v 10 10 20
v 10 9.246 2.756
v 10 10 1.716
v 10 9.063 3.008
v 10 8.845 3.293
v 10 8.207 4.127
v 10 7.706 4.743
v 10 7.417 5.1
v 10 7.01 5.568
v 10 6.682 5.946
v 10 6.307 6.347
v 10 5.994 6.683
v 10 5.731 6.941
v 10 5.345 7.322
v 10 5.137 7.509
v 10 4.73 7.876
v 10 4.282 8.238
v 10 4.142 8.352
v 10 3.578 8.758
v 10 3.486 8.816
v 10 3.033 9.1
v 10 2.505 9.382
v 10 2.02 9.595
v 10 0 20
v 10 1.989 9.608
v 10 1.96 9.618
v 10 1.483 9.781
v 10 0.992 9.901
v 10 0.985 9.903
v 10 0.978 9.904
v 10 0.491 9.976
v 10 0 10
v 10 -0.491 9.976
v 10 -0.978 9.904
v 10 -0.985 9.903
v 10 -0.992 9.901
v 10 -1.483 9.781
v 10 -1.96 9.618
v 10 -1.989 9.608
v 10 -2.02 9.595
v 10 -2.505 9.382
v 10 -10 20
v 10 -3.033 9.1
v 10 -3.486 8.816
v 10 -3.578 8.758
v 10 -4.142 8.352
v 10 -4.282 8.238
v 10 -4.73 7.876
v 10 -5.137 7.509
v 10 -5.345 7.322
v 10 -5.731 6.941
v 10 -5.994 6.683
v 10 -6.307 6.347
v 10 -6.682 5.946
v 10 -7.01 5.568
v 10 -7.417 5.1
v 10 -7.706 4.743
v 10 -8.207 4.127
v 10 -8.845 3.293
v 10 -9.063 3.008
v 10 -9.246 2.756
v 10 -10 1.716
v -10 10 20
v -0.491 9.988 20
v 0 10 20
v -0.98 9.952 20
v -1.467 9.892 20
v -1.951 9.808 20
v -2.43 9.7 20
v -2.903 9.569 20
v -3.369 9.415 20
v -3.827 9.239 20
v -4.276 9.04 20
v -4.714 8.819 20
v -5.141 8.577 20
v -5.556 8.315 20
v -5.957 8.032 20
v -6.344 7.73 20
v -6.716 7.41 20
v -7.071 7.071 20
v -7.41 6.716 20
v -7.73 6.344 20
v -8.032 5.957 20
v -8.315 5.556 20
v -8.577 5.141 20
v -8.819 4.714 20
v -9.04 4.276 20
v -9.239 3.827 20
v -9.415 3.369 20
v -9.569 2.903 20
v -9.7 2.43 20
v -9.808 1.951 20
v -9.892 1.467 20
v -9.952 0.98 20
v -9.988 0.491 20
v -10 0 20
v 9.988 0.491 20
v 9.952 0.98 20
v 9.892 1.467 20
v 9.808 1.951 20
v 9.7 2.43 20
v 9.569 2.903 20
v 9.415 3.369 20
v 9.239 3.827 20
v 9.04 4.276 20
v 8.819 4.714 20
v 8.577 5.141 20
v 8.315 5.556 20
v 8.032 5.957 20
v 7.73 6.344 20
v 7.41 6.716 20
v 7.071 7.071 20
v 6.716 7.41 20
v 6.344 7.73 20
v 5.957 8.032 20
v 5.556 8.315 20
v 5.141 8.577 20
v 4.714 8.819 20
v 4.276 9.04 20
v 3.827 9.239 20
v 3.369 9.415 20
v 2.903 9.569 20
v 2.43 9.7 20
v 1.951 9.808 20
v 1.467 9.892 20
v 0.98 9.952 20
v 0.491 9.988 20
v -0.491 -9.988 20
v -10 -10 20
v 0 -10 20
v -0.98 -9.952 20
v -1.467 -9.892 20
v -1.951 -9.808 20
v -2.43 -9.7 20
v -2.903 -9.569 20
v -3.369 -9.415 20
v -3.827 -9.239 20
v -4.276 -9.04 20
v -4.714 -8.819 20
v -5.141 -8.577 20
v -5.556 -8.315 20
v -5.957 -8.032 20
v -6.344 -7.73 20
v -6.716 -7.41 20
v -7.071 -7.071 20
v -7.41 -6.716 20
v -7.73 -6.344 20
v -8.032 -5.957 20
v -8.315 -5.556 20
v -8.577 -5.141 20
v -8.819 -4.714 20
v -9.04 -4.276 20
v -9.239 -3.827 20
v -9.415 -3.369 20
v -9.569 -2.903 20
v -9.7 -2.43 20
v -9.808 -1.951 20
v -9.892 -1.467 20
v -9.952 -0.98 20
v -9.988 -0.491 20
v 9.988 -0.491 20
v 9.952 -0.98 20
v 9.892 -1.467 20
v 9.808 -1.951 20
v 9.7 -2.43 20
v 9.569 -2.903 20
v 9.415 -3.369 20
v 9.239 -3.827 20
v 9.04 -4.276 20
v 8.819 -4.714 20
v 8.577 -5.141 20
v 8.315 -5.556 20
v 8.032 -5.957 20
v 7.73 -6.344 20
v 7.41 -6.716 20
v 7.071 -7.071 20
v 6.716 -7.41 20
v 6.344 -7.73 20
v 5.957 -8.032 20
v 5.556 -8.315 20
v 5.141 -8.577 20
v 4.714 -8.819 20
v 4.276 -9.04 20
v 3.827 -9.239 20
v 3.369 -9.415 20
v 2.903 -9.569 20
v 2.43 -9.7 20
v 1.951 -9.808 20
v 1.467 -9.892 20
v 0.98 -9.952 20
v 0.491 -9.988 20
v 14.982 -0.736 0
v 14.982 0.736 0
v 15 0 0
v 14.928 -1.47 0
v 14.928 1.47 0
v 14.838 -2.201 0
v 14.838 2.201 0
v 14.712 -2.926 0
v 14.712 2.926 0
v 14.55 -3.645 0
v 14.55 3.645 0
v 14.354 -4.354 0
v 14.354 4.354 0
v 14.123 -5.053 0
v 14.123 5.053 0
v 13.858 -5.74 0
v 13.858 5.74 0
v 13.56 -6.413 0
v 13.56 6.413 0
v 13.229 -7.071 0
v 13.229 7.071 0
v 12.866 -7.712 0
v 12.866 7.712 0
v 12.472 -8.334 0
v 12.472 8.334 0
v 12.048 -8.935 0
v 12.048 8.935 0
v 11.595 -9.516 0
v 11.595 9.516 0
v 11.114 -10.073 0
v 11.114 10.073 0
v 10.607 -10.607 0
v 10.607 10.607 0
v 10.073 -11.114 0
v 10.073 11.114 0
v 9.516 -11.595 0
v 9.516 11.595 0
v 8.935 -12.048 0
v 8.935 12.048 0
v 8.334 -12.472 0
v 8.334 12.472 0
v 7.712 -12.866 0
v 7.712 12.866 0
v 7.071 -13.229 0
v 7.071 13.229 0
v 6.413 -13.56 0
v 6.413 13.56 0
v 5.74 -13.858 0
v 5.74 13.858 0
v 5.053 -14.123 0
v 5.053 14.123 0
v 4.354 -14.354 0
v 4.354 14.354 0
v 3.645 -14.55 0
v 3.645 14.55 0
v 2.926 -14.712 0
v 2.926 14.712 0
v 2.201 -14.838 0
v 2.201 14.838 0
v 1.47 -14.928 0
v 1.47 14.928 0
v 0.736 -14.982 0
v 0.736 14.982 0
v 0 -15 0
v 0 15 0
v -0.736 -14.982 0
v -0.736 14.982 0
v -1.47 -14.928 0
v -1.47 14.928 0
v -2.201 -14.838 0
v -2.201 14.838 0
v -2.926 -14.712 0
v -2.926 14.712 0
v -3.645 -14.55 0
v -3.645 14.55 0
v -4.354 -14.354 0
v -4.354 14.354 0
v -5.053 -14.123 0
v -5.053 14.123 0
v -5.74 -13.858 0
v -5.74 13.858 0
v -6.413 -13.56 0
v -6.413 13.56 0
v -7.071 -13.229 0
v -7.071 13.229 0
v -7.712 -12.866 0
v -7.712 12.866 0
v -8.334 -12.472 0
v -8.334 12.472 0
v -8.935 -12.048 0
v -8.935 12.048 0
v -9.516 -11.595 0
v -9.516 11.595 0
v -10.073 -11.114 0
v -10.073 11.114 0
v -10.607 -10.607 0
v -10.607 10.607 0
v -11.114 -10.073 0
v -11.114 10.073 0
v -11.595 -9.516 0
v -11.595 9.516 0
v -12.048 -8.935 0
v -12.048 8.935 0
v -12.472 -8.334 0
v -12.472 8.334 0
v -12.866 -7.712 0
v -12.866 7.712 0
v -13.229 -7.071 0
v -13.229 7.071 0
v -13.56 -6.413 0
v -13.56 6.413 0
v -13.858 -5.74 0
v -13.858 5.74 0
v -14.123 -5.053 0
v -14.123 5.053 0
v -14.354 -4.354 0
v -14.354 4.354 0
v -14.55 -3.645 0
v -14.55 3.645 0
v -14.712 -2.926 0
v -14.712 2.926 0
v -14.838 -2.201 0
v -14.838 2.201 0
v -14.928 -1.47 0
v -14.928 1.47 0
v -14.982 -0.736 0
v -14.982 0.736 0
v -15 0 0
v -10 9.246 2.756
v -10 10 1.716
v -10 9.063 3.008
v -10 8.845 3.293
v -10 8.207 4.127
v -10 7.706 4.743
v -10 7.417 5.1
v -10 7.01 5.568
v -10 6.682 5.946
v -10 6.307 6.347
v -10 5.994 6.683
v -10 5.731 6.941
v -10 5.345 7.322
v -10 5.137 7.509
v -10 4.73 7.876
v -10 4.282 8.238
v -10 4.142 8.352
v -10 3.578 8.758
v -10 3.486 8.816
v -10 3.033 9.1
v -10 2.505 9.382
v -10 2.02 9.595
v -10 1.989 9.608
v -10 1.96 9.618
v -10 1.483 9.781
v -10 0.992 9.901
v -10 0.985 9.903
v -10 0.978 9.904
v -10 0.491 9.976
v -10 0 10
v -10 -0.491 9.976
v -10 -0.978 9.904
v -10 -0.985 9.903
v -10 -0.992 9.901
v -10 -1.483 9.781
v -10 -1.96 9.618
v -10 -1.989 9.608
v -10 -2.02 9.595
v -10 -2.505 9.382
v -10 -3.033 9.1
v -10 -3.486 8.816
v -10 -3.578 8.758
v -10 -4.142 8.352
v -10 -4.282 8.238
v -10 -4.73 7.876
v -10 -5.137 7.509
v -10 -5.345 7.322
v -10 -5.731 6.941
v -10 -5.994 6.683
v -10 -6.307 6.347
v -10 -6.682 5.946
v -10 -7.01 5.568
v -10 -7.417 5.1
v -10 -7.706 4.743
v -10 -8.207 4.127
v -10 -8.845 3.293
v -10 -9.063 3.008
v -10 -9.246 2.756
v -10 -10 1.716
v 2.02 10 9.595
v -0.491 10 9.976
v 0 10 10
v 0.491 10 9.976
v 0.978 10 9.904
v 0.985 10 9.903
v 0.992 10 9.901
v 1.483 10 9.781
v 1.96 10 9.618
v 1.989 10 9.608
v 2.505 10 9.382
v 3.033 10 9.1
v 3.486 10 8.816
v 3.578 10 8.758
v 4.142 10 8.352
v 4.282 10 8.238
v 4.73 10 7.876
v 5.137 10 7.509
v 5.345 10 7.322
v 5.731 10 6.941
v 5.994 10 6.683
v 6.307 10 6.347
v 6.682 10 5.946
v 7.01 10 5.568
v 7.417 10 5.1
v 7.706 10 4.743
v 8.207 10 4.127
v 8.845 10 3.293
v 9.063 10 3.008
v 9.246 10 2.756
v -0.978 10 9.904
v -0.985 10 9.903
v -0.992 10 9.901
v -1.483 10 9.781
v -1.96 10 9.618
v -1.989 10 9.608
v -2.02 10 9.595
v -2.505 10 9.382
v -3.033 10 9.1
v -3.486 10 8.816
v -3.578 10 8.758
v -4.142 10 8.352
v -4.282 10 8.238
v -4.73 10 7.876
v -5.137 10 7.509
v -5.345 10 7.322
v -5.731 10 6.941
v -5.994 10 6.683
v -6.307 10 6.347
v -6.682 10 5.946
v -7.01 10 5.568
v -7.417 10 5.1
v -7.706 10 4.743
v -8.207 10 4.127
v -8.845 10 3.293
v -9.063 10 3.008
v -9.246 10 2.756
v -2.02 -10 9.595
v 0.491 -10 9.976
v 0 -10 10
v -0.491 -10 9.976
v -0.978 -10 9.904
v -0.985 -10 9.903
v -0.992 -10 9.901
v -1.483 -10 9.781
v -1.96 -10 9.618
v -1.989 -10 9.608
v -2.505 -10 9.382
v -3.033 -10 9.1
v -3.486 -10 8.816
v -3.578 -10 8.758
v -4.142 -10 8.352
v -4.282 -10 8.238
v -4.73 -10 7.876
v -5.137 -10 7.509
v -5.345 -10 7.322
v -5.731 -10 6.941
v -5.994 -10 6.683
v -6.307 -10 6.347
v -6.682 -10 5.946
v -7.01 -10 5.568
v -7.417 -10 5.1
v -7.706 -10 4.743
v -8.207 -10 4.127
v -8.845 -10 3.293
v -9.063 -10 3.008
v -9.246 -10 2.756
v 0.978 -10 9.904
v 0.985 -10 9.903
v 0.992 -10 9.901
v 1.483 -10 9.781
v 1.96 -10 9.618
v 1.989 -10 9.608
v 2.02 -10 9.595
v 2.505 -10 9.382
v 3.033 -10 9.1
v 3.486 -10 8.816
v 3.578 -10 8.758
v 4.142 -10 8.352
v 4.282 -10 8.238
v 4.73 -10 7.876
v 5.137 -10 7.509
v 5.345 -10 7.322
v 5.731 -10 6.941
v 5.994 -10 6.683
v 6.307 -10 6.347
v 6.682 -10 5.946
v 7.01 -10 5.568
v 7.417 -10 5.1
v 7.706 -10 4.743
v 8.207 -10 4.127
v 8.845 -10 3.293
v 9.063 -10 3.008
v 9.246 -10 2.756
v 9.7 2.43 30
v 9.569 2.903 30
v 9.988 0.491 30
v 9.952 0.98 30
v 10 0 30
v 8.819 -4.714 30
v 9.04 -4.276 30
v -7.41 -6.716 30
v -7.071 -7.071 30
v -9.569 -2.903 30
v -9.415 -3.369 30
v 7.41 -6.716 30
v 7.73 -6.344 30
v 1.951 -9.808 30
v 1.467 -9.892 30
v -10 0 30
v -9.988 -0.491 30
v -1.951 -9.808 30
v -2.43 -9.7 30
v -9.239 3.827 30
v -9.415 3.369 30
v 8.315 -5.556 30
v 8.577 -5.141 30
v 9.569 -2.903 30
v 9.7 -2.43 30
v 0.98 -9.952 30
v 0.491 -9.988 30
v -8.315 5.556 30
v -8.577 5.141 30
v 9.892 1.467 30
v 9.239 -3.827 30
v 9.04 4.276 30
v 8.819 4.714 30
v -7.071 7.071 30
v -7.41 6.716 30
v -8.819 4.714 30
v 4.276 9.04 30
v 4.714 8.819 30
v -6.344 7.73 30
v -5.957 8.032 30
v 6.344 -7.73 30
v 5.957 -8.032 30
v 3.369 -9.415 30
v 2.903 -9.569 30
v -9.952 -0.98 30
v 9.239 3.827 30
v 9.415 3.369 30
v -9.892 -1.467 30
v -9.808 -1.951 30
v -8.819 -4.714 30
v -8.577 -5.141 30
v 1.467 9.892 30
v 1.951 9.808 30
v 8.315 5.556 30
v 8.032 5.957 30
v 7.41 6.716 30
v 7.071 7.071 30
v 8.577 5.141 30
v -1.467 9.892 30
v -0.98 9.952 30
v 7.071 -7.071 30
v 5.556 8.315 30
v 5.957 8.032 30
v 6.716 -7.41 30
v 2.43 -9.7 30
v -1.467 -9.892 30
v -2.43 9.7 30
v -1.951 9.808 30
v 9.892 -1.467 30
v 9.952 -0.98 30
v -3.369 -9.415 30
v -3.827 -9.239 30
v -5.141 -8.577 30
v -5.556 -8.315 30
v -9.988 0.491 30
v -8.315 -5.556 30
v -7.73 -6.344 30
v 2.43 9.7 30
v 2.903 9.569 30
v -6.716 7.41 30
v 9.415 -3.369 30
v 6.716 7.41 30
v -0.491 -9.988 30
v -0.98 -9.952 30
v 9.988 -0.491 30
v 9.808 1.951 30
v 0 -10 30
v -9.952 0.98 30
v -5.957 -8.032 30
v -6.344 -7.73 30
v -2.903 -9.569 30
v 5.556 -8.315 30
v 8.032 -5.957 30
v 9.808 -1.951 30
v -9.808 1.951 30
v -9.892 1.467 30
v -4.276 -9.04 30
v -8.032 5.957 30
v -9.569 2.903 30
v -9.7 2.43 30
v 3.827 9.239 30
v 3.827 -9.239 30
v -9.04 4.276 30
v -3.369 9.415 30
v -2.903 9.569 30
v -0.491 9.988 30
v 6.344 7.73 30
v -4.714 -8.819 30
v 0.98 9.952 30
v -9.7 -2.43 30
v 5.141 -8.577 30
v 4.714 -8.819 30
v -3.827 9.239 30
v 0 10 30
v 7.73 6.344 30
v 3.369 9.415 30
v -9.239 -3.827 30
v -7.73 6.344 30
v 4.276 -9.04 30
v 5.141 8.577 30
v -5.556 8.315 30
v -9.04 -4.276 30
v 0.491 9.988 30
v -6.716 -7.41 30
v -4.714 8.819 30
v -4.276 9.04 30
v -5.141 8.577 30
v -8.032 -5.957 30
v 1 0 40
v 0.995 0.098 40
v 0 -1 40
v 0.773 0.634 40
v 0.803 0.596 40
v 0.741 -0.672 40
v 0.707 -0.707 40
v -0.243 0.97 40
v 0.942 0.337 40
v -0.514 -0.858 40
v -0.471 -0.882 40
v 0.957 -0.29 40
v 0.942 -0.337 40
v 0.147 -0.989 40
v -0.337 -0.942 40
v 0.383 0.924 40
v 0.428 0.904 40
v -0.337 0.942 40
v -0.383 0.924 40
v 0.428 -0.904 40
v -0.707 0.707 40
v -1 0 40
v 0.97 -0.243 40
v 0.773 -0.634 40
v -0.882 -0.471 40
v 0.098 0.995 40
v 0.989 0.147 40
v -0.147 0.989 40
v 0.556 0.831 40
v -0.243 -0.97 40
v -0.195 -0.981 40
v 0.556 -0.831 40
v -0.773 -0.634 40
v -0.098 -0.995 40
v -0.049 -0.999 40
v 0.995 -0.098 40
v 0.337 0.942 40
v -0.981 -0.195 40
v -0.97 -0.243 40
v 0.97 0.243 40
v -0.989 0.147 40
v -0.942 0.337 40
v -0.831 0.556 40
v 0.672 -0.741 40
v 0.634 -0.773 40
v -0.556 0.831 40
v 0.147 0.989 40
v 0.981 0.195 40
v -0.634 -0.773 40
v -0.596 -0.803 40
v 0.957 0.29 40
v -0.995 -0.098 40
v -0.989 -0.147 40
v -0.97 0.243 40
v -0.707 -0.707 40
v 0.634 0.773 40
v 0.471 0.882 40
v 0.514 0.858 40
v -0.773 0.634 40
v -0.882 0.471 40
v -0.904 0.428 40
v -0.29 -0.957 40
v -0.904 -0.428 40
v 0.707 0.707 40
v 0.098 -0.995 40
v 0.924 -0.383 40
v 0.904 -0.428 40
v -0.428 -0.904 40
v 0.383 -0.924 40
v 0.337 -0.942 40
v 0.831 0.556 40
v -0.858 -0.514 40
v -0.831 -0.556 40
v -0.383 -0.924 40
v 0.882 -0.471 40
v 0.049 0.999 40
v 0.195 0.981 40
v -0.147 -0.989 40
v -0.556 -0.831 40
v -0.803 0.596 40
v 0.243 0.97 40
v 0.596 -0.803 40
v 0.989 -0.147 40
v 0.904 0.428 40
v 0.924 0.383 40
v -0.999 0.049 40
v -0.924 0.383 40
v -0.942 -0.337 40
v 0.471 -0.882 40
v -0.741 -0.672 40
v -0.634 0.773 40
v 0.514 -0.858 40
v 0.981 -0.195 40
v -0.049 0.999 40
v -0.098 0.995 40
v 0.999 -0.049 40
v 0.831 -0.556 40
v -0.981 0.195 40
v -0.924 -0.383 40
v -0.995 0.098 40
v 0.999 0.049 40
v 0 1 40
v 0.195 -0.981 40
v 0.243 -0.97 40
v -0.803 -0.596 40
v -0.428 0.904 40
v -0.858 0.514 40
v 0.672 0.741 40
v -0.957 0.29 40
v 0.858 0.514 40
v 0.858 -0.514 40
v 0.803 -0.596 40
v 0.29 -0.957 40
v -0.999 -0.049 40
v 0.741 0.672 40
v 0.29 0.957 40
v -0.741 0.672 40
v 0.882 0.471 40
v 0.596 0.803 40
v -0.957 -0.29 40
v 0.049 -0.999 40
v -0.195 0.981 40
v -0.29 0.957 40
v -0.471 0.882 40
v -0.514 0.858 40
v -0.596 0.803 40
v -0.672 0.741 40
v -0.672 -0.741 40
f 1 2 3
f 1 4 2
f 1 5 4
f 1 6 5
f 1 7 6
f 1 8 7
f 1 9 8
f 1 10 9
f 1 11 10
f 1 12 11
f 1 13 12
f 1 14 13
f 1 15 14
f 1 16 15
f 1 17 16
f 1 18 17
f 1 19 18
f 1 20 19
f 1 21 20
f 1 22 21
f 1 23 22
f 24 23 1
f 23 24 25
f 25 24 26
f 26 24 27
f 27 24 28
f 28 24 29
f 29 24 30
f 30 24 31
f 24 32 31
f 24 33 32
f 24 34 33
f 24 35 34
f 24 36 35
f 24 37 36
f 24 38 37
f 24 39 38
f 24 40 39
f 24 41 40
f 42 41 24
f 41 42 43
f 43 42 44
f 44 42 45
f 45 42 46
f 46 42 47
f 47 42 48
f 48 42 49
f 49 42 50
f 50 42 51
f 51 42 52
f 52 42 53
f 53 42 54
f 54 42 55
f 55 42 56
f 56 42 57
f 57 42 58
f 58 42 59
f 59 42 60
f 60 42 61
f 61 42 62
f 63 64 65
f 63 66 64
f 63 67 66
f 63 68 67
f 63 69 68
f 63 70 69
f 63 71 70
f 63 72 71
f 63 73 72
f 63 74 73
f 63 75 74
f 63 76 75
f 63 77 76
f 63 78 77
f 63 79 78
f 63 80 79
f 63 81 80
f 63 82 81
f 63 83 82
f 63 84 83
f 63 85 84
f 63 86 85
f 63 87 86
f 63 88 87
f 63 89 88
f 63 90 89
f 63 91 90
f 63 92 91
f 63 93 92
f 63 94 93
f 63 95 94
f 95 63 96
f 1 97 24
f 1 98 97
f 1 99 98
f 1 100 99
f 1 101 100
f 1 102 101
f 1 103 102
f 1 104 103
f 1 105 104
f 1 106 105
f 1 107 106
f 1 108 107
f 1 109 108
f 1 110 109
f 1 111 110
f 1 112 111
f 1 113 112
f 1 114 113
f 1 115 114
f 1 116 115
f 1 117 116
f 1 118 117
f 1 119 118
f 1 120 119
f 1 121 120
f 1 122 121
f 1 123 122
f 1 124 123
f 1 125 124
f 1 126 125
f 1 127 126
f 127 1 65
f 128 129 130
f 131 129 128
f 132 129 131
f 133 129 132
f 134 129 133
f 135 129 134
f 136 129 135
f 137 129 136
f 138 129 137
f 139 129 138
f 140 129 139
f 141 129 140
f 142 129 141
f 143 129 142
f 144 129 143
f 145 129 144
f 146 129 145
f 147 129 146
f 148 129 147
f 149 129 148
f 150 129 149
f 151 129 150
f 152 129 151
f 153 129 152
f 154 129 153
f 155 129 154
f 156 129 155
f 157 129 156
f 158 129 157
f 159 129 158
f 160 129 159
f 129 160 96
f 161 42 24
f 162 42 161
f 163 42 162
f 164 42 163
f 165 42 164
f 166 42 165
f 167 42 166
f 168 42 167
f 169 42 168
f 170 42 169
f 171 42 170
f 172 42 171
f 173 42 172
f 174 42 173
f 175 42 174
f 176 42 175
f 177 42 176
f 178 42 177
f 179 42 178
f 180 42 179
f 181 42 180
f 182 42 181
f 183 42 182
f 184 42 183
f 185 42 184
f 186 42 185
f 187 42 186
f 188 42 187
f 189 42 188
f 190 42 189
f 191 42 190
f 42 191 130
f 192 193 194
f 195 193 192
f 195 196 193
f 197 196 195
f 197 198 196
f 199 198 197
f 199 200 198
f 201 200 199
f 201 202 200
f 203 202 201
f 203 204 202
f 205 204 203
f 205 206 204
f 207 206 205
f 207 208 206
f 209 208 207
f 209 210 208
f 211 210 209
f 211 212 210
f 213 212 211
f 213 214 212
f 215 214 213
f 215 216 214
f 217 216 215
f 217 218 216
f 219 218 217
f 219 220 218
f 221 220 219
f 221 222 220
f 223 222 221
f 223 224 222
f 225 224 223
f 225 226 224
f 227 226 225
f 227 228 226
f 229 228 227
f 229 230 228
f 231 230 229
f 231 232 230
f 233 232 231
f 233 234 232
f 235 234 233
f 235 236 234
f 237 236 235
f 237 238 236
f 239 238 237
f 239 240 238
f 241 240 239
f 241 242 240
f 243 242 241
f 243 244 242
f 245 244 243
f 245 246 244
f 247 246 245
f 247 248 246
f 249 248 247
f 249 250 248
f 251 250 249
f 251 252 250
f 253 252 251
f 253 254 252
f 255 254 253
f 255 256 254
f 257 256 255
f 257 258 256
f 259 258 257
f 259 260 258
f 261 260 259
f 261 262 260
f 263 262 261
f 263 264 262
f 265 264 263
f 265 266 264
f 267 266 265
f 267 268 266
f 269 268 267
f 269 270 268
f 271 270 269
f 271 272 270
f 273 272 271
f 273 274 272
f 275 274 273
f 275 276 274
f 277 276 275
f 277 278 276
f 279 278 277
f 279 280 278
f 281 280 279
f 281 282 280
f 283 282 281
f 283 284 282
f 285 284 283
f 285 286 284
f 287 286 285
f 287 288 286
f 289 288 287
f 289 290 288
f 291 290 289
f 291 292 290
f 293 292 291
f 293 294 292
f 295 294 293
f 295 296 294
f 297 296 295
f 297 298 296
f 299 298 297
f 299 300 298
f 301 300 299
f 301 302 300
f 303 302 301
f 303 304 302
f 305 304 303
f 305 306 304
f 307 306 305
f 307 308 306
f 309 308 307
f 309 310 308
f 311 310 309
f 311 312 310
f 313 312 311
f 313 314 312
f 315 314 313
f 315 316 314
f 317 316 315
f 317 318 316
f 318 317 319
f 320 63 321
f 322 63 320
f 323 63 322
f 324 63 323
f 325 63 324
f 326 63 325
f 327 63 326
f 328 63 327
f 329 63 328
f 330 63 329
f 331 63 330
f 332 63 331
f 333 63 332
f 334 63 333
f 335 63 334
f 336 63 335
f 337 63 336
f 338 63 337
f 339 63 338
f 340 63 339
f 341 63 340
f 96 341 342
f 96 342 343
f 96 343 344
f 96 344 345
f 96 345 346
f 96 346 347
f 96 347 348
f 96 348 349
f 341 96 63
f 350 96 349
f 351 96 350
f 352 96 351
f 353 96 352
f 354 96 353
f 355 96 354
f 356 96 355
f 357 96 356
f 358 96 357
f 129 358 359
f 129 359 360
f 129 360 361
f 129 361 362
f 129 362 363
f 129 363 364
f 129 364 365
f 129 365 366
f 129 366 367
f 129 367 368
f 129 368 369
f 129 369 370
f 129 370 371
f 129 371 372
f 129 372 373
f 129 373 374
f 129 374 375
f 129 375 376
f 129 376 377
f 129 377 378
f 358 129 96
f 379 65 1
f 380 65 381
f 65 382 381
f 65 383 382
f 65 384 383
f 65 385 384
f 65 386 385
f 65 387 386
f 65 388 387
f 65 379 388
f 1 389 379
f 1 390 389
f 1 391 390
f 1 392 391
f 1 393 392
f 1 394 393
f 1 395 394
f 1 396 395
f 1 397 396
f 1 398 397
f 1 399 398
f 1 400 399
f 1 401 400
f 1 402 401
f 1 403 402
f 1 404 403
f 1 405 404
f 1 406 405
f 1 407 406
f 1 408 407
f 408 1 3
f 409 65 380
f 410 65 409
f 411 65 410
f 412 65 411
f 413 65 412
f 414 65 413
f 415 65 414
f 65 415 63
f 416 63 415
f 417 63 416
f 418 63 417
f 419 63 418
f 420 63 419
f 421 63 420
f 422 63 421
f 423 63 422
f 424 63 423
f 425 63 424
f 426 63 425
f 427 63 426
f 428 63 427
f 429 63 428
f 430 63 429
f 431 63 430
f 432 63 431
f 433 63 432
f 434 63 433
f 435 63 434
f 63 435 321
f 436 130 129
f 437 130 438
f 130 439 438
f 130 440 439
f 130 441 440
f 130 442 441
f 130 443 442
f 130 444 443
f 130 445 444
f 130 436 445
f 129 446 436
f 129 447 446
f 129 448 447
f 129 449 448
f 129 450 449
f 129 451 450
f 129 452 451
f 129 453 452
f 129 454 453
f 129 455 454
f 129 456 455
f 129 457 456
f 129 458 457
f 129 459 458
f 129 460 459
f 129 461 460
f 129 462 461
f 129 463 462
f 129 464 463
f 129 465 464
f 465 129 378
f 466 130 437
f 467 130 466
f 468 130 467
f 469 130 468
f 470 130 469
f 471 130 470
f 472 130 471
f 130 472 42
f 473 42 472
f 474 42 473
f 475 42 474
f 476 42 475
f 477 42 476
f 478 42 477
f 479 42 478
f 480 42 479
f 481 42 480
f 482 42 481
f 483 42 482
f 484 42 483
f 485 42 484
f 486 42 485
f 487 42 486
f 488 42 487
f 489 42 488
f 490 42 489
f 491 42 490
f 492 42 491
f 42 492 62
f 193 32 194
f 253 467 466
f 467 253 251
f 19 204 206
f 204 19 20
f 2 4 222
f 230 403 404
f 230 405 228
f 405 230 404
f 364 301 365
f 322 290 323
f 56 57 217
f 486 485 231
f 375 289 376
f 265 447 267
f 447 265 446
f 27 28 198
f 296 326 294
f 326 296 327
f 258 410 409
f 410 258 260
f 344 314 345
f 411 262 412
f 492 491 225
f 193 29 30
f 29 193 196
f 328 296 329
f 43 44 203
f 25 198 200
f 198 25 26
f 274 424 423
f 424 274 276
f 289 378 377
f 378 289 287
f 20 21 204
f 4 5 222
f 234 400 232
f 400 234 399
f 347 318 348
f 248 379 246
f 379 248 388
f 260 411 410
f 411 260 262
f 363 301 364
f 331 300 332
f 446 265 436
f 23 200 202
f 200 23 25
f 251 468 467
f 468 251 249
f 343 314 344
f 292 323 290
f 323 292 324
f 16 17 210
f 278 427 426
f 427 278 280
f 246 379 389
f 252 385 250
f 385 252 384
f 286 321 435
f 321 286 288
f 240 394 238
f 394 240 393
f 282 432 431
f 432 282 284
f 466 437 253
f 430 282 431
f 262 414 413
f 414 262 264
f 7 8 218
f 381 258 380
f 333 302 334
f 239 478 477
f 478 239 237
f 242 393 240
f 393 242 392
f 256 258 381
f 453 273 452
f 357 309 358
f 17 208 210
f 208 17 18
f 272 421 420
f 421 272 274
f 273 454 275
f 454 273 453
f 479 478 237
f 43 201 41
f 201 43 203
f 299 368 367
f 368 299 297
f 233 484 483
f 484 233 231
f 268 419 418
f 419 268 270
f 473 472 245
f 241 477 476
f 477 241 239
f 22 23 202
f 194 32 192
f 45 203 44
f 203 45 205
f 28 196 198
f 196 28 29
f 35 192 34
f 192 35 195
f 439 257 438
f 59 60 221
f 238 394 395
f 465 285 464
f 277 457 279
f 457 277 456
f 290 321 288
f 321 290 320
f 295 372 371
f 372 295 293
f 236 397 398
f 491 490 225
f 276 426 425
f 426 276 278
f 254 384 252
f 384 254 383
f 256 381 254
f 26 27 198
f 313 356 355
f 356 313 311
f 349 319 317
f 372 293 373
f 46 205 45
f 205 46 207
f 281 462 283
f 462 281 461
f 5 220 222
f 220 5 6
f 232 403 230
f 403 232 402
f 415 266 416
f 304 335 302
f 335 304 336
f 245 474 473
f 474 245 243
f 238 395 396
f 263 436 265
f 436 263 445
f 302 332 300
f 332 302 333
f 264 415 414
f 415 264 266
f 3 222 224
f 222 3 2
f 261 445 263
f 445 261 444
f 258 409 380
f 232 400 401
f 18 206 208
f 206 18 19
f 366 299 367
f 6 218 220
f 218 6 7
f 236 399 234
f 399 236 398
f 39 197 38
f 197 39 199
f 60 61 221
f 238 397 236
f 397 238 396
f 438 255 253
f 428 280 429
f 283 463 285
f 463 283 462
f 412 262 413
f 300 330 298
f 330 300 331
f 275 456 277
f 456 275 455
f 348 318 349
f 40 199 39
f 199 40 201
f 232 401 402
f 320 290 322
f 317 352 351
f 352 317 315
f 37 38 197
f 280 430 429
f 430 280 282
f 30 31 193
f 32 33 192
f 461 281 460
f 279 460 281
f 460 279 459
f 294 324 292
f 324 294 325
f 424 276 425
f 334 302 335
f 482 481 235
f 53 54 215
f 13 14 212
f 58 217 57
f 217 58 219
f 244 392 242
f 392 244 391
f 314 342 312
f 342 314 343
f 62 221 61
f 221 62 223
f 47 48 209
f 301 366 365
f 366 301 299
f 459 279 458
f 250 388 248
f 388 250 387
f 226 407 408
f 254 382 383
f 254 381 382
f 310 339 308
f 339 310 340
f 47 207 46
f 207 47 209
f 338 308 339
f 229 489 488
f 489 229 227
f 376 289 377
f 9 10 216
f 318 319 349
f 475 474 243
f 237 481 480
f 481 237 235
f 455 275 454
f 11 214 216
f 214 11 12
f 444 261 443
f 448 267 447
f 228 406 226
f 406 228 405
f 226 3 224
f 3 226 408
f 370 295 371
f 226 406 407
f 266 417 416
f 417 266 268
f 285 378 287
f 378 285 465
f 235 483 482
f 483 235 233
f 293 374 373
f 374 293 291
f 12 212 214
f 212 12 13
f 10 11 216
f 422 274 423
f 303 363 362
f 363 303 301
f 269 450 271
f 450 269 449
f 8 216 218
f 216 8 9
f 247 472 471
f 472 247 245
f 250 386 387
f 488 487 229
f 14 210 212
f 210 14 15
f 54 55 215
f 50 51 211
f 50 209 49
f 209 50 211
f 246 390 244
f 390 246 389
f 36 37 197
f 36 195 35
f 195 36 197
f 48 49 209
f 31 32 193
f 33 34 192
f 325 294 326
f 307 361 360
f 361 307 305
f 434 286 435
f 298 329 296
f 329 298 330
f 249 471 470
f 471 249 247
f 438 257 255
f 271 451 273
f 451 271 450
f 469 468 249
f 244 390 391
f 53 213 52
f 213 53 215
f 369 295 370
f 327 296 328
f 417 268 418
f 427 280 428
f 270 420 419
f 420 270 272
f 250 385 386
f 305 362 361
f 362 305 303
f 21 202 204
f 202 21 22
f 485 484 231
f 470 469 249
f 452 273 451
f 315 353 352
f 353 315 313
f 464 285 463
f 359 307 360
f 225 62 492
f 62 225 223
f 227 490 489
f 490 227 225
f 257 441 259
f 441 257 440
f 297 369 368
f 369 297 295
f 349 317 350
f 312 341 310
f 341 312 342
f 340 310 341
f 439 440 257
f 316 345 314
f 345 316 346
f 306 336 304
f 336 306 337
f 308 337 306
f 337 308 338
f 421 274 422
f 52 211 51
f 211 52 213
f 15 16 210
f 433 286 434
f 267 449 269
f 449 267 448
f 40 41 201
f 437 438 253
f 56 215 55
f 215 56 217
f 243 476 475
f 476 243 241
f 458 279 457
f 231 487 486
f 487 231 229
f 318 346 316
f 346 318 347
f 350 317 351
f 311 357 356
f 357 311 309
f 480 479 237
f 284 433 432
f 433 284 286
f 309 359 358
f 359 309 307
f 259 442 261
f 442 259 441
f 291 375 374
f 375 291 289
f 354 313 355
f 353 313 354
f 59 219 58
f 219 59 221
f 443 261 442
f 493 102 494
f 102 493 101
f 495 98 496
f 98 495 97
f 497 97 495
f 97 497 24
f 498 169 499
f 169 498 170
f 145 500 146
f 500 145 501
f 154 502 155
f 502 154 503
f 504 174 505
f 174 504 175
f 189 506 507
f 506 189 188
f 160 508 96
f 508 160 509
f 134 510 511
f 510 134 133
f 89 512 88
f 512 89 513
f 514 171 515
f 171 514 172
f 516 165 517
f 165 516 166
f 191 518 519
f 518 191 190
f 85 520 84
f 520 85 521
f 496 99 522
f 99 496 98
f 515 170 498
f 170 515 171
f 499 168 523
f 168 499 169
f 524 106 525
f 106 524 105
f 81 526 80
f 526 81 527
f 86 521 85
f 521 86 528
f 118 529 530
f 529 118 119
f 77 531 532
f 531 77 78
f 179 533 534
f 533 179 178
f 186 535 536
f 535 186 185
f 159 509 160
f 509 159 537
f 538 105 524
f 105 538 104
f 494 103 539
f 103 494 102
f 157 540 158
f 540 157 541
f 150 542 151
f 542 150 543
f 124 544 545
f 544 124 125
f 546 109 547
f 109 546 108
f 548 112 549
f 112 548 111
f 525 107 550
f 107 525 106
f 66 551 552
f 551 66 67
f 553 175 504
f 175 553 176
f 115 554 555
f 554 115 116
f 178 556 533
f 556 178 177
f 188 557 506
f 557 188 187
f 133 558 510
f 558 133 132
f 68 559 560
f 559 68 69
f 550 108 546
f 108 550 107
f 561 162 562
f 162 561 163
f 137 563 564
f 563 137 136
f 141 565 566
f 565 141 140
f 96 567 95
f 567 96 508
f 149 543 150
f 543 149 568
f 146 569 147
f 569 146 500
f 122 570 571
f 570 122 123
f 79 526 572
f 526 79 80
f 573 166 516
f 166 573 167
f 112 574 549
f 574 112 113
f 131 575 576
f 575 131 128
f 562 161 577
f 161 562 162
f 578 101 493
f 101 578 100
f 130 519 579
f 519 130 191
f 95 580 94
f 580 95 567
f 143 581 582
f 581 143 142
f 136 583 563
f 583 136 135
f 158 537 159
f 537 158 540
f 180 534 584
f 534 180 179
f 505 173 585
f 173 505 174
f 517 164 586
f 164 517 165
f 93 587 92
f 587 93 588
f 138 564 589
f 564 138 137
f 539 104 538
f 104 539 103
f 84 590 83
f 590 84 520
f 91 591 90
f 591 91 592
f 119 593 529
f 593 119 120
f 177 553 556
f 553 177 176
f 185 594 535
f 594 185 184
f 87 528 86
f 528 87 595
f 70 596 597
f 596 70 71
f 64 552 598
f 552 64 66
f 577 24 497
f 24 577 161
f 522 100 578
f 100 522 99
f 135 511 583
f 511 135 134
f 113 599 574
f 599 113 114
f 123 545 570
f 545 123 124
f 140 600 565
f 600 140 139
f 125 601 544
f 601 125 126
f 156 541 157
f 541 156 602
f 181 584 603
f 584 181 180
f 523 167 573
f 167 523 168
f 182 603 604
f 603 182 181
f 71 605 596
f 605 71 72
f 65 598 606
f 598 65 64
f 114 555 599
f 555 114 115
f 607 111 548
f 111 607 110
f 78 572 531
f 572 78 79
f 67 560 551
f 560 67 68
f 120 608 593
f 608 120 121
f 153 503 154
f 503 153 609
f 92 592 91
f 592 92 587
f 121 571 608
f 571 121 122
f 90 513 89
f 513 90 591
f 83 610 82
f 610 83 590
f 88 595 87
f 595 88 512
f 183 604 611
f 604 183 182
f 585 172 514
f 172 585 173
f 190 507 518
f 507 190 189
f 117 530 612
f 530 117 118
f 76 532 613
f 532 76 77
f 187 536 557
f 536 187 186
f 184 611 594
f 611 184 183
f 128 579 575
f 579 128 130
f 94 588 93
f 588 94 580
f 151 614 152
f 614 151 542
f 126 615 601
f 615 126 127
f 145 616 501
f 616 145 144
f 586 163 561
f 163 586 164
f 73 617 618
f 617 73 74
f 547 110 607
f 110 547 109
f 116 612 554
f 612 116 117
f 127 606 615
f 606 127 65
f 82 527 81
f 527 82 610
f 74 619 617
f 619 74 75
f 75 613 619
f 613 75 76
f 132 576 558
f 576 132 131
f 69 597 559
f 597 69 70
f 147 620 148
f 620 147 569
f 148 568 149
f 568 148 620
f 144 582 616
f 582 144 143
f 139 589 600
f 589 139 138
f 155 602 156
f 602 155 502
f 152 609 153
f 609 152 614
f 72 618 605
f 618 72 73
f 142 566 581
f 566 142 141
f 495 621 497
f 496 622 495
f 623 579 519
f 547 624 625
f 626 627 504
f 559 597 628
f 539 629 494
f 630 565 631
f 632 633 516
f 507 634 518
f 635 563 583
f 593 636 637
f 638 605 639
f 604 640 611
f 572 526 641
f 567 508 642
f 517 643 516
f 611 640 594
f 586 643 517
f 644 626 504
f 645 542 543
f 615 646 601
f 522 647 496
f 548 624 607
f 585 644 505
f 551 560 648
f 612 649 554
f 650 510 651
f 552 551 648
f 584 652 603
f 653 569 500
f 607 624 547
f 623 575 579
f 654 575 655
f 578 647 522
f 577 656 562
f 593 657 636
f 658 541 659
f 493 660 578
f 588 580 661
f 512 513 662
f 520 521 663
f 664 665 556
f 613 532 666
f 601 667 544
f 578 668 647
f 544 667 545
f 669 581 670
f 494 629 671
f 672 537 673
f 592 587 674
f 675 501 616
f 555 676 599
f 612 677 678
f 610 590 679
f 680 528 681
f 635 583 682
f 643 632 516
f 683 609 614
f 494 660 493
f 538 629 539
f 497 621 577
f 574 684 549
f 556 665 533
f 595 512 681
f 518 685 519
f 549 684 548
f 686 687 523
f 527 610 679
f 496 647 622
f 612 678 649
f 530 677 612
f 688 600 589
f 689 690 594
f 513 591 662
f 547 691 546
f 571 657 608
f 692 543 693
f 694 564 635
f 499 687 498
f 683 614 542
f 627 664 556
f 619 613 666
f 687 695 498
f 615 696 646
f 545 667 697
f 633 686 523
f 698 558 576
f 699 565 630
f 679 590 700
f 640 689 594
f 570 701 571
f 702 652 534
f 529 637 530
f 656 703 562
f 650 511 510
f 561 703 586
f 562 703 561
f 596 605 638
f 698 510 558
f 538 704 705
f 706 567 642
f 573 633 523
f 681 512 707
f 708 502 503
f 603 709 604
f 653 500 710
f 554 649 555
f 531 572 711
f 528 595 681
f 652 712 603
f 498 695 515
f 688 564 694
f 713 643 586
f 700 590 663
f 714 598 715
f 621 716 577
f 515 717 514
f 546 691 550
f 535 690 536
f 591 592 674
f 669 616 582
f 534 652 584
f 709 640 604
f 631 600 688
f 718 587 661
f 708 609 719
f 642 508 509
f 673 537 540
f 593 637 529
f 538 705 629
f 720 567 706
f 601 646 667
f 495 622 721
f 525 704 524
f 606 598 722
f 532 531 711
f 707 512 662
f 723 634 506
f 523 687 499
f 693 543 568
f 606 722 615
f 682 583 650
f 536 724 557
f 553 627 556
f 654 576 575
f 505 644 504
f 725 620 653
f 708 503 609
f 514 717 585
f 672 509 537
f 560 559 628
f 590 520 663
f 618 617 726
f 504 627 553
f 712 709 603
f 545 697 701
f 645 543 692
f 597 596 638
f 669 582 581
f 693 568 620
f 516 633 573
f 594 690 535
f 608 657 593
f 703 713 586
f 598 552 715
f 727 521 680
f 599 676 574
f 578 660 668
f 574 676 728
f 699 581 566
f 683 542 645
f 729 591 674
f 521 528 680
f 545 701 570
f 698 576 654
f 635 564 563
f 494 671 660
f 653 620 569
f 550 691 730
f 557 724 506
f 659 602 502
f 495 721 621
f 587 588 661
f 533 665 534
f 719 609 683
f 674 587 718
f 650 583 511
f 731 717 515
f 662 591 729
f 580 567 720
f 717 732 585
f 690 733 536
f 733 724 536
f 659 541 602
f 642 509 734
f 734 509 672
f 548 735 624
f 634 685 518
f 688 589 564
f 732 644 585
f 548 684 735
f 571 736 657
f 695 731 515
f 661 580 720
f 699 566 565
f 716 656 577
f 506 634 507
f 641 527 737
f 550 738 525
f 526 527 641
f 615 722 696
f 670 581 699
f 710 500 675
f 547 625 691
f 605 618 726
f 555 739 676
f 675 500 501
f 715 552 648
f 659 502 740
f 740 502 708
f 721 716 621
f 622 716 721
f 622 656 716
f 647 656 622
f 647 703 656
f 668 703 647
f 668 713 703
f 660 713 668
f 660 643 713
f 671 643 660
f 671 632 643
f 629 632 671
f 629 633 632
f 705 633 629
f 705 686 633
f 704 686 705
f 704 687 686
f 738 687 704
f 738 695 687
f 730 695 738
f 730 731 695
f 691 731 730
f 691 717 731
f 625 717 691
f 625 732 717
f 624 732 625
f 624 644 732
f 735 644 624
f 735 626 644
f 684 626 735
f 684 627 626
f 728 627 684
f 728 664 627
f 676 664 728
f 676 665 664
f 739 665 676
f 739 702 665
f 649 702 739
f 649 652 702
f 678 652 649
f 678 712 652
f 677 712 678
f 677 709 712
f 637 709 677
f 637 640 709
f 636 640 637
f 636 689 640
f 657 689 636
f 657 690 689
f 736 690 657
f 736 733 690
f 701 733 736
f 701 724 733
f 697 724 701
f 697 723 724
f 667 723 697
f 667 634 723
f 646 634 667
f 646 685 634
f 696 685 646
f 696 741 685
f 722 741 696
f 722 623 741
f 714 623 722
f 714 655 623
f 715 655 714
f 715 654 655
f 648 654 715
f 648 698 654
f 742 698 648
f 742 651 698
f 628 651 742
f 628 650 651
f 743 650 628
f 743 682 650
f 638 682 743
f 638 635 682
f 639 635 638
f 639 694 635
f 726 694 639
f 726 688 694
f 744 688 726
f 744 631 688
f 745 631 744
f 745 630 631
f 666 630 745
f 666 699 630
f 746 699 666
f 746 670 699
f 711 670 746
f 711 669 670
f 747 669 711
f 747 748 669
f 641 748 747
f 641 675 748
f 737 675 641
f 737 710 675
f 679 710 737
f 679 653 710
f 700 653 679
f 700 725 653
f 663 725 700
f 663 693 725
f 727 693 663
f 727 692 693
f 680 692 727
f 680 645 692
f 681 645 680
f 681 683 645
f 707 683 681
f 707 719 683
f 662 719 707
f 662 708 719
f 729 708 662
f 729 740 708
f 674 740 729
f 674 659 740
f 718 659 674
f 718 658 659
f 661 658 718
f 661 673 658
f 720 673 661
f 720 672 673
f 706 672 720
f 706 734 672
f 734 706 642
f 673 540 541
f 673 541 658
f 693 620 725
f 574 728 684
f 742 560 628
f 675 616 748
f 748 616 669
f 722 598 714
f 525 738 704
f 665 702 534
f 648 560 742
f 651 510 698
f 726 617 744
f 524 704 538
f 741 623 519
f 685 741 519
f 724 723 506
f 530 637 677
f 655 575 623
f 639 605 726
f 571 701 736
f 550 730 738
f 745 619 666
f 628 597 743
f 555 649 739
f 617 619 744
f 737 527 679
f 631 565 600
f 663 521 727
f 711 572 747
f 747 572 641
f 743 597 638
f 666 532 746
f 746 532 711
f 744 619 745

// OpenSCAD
$fn=128;
translate([-10,-10,0])cube([20,20,20]);
cylinder (10,15,10);
translate([0,0,20])cylinder (10,10,10);
translate([0,0,30])cylinder (10,10,1);
